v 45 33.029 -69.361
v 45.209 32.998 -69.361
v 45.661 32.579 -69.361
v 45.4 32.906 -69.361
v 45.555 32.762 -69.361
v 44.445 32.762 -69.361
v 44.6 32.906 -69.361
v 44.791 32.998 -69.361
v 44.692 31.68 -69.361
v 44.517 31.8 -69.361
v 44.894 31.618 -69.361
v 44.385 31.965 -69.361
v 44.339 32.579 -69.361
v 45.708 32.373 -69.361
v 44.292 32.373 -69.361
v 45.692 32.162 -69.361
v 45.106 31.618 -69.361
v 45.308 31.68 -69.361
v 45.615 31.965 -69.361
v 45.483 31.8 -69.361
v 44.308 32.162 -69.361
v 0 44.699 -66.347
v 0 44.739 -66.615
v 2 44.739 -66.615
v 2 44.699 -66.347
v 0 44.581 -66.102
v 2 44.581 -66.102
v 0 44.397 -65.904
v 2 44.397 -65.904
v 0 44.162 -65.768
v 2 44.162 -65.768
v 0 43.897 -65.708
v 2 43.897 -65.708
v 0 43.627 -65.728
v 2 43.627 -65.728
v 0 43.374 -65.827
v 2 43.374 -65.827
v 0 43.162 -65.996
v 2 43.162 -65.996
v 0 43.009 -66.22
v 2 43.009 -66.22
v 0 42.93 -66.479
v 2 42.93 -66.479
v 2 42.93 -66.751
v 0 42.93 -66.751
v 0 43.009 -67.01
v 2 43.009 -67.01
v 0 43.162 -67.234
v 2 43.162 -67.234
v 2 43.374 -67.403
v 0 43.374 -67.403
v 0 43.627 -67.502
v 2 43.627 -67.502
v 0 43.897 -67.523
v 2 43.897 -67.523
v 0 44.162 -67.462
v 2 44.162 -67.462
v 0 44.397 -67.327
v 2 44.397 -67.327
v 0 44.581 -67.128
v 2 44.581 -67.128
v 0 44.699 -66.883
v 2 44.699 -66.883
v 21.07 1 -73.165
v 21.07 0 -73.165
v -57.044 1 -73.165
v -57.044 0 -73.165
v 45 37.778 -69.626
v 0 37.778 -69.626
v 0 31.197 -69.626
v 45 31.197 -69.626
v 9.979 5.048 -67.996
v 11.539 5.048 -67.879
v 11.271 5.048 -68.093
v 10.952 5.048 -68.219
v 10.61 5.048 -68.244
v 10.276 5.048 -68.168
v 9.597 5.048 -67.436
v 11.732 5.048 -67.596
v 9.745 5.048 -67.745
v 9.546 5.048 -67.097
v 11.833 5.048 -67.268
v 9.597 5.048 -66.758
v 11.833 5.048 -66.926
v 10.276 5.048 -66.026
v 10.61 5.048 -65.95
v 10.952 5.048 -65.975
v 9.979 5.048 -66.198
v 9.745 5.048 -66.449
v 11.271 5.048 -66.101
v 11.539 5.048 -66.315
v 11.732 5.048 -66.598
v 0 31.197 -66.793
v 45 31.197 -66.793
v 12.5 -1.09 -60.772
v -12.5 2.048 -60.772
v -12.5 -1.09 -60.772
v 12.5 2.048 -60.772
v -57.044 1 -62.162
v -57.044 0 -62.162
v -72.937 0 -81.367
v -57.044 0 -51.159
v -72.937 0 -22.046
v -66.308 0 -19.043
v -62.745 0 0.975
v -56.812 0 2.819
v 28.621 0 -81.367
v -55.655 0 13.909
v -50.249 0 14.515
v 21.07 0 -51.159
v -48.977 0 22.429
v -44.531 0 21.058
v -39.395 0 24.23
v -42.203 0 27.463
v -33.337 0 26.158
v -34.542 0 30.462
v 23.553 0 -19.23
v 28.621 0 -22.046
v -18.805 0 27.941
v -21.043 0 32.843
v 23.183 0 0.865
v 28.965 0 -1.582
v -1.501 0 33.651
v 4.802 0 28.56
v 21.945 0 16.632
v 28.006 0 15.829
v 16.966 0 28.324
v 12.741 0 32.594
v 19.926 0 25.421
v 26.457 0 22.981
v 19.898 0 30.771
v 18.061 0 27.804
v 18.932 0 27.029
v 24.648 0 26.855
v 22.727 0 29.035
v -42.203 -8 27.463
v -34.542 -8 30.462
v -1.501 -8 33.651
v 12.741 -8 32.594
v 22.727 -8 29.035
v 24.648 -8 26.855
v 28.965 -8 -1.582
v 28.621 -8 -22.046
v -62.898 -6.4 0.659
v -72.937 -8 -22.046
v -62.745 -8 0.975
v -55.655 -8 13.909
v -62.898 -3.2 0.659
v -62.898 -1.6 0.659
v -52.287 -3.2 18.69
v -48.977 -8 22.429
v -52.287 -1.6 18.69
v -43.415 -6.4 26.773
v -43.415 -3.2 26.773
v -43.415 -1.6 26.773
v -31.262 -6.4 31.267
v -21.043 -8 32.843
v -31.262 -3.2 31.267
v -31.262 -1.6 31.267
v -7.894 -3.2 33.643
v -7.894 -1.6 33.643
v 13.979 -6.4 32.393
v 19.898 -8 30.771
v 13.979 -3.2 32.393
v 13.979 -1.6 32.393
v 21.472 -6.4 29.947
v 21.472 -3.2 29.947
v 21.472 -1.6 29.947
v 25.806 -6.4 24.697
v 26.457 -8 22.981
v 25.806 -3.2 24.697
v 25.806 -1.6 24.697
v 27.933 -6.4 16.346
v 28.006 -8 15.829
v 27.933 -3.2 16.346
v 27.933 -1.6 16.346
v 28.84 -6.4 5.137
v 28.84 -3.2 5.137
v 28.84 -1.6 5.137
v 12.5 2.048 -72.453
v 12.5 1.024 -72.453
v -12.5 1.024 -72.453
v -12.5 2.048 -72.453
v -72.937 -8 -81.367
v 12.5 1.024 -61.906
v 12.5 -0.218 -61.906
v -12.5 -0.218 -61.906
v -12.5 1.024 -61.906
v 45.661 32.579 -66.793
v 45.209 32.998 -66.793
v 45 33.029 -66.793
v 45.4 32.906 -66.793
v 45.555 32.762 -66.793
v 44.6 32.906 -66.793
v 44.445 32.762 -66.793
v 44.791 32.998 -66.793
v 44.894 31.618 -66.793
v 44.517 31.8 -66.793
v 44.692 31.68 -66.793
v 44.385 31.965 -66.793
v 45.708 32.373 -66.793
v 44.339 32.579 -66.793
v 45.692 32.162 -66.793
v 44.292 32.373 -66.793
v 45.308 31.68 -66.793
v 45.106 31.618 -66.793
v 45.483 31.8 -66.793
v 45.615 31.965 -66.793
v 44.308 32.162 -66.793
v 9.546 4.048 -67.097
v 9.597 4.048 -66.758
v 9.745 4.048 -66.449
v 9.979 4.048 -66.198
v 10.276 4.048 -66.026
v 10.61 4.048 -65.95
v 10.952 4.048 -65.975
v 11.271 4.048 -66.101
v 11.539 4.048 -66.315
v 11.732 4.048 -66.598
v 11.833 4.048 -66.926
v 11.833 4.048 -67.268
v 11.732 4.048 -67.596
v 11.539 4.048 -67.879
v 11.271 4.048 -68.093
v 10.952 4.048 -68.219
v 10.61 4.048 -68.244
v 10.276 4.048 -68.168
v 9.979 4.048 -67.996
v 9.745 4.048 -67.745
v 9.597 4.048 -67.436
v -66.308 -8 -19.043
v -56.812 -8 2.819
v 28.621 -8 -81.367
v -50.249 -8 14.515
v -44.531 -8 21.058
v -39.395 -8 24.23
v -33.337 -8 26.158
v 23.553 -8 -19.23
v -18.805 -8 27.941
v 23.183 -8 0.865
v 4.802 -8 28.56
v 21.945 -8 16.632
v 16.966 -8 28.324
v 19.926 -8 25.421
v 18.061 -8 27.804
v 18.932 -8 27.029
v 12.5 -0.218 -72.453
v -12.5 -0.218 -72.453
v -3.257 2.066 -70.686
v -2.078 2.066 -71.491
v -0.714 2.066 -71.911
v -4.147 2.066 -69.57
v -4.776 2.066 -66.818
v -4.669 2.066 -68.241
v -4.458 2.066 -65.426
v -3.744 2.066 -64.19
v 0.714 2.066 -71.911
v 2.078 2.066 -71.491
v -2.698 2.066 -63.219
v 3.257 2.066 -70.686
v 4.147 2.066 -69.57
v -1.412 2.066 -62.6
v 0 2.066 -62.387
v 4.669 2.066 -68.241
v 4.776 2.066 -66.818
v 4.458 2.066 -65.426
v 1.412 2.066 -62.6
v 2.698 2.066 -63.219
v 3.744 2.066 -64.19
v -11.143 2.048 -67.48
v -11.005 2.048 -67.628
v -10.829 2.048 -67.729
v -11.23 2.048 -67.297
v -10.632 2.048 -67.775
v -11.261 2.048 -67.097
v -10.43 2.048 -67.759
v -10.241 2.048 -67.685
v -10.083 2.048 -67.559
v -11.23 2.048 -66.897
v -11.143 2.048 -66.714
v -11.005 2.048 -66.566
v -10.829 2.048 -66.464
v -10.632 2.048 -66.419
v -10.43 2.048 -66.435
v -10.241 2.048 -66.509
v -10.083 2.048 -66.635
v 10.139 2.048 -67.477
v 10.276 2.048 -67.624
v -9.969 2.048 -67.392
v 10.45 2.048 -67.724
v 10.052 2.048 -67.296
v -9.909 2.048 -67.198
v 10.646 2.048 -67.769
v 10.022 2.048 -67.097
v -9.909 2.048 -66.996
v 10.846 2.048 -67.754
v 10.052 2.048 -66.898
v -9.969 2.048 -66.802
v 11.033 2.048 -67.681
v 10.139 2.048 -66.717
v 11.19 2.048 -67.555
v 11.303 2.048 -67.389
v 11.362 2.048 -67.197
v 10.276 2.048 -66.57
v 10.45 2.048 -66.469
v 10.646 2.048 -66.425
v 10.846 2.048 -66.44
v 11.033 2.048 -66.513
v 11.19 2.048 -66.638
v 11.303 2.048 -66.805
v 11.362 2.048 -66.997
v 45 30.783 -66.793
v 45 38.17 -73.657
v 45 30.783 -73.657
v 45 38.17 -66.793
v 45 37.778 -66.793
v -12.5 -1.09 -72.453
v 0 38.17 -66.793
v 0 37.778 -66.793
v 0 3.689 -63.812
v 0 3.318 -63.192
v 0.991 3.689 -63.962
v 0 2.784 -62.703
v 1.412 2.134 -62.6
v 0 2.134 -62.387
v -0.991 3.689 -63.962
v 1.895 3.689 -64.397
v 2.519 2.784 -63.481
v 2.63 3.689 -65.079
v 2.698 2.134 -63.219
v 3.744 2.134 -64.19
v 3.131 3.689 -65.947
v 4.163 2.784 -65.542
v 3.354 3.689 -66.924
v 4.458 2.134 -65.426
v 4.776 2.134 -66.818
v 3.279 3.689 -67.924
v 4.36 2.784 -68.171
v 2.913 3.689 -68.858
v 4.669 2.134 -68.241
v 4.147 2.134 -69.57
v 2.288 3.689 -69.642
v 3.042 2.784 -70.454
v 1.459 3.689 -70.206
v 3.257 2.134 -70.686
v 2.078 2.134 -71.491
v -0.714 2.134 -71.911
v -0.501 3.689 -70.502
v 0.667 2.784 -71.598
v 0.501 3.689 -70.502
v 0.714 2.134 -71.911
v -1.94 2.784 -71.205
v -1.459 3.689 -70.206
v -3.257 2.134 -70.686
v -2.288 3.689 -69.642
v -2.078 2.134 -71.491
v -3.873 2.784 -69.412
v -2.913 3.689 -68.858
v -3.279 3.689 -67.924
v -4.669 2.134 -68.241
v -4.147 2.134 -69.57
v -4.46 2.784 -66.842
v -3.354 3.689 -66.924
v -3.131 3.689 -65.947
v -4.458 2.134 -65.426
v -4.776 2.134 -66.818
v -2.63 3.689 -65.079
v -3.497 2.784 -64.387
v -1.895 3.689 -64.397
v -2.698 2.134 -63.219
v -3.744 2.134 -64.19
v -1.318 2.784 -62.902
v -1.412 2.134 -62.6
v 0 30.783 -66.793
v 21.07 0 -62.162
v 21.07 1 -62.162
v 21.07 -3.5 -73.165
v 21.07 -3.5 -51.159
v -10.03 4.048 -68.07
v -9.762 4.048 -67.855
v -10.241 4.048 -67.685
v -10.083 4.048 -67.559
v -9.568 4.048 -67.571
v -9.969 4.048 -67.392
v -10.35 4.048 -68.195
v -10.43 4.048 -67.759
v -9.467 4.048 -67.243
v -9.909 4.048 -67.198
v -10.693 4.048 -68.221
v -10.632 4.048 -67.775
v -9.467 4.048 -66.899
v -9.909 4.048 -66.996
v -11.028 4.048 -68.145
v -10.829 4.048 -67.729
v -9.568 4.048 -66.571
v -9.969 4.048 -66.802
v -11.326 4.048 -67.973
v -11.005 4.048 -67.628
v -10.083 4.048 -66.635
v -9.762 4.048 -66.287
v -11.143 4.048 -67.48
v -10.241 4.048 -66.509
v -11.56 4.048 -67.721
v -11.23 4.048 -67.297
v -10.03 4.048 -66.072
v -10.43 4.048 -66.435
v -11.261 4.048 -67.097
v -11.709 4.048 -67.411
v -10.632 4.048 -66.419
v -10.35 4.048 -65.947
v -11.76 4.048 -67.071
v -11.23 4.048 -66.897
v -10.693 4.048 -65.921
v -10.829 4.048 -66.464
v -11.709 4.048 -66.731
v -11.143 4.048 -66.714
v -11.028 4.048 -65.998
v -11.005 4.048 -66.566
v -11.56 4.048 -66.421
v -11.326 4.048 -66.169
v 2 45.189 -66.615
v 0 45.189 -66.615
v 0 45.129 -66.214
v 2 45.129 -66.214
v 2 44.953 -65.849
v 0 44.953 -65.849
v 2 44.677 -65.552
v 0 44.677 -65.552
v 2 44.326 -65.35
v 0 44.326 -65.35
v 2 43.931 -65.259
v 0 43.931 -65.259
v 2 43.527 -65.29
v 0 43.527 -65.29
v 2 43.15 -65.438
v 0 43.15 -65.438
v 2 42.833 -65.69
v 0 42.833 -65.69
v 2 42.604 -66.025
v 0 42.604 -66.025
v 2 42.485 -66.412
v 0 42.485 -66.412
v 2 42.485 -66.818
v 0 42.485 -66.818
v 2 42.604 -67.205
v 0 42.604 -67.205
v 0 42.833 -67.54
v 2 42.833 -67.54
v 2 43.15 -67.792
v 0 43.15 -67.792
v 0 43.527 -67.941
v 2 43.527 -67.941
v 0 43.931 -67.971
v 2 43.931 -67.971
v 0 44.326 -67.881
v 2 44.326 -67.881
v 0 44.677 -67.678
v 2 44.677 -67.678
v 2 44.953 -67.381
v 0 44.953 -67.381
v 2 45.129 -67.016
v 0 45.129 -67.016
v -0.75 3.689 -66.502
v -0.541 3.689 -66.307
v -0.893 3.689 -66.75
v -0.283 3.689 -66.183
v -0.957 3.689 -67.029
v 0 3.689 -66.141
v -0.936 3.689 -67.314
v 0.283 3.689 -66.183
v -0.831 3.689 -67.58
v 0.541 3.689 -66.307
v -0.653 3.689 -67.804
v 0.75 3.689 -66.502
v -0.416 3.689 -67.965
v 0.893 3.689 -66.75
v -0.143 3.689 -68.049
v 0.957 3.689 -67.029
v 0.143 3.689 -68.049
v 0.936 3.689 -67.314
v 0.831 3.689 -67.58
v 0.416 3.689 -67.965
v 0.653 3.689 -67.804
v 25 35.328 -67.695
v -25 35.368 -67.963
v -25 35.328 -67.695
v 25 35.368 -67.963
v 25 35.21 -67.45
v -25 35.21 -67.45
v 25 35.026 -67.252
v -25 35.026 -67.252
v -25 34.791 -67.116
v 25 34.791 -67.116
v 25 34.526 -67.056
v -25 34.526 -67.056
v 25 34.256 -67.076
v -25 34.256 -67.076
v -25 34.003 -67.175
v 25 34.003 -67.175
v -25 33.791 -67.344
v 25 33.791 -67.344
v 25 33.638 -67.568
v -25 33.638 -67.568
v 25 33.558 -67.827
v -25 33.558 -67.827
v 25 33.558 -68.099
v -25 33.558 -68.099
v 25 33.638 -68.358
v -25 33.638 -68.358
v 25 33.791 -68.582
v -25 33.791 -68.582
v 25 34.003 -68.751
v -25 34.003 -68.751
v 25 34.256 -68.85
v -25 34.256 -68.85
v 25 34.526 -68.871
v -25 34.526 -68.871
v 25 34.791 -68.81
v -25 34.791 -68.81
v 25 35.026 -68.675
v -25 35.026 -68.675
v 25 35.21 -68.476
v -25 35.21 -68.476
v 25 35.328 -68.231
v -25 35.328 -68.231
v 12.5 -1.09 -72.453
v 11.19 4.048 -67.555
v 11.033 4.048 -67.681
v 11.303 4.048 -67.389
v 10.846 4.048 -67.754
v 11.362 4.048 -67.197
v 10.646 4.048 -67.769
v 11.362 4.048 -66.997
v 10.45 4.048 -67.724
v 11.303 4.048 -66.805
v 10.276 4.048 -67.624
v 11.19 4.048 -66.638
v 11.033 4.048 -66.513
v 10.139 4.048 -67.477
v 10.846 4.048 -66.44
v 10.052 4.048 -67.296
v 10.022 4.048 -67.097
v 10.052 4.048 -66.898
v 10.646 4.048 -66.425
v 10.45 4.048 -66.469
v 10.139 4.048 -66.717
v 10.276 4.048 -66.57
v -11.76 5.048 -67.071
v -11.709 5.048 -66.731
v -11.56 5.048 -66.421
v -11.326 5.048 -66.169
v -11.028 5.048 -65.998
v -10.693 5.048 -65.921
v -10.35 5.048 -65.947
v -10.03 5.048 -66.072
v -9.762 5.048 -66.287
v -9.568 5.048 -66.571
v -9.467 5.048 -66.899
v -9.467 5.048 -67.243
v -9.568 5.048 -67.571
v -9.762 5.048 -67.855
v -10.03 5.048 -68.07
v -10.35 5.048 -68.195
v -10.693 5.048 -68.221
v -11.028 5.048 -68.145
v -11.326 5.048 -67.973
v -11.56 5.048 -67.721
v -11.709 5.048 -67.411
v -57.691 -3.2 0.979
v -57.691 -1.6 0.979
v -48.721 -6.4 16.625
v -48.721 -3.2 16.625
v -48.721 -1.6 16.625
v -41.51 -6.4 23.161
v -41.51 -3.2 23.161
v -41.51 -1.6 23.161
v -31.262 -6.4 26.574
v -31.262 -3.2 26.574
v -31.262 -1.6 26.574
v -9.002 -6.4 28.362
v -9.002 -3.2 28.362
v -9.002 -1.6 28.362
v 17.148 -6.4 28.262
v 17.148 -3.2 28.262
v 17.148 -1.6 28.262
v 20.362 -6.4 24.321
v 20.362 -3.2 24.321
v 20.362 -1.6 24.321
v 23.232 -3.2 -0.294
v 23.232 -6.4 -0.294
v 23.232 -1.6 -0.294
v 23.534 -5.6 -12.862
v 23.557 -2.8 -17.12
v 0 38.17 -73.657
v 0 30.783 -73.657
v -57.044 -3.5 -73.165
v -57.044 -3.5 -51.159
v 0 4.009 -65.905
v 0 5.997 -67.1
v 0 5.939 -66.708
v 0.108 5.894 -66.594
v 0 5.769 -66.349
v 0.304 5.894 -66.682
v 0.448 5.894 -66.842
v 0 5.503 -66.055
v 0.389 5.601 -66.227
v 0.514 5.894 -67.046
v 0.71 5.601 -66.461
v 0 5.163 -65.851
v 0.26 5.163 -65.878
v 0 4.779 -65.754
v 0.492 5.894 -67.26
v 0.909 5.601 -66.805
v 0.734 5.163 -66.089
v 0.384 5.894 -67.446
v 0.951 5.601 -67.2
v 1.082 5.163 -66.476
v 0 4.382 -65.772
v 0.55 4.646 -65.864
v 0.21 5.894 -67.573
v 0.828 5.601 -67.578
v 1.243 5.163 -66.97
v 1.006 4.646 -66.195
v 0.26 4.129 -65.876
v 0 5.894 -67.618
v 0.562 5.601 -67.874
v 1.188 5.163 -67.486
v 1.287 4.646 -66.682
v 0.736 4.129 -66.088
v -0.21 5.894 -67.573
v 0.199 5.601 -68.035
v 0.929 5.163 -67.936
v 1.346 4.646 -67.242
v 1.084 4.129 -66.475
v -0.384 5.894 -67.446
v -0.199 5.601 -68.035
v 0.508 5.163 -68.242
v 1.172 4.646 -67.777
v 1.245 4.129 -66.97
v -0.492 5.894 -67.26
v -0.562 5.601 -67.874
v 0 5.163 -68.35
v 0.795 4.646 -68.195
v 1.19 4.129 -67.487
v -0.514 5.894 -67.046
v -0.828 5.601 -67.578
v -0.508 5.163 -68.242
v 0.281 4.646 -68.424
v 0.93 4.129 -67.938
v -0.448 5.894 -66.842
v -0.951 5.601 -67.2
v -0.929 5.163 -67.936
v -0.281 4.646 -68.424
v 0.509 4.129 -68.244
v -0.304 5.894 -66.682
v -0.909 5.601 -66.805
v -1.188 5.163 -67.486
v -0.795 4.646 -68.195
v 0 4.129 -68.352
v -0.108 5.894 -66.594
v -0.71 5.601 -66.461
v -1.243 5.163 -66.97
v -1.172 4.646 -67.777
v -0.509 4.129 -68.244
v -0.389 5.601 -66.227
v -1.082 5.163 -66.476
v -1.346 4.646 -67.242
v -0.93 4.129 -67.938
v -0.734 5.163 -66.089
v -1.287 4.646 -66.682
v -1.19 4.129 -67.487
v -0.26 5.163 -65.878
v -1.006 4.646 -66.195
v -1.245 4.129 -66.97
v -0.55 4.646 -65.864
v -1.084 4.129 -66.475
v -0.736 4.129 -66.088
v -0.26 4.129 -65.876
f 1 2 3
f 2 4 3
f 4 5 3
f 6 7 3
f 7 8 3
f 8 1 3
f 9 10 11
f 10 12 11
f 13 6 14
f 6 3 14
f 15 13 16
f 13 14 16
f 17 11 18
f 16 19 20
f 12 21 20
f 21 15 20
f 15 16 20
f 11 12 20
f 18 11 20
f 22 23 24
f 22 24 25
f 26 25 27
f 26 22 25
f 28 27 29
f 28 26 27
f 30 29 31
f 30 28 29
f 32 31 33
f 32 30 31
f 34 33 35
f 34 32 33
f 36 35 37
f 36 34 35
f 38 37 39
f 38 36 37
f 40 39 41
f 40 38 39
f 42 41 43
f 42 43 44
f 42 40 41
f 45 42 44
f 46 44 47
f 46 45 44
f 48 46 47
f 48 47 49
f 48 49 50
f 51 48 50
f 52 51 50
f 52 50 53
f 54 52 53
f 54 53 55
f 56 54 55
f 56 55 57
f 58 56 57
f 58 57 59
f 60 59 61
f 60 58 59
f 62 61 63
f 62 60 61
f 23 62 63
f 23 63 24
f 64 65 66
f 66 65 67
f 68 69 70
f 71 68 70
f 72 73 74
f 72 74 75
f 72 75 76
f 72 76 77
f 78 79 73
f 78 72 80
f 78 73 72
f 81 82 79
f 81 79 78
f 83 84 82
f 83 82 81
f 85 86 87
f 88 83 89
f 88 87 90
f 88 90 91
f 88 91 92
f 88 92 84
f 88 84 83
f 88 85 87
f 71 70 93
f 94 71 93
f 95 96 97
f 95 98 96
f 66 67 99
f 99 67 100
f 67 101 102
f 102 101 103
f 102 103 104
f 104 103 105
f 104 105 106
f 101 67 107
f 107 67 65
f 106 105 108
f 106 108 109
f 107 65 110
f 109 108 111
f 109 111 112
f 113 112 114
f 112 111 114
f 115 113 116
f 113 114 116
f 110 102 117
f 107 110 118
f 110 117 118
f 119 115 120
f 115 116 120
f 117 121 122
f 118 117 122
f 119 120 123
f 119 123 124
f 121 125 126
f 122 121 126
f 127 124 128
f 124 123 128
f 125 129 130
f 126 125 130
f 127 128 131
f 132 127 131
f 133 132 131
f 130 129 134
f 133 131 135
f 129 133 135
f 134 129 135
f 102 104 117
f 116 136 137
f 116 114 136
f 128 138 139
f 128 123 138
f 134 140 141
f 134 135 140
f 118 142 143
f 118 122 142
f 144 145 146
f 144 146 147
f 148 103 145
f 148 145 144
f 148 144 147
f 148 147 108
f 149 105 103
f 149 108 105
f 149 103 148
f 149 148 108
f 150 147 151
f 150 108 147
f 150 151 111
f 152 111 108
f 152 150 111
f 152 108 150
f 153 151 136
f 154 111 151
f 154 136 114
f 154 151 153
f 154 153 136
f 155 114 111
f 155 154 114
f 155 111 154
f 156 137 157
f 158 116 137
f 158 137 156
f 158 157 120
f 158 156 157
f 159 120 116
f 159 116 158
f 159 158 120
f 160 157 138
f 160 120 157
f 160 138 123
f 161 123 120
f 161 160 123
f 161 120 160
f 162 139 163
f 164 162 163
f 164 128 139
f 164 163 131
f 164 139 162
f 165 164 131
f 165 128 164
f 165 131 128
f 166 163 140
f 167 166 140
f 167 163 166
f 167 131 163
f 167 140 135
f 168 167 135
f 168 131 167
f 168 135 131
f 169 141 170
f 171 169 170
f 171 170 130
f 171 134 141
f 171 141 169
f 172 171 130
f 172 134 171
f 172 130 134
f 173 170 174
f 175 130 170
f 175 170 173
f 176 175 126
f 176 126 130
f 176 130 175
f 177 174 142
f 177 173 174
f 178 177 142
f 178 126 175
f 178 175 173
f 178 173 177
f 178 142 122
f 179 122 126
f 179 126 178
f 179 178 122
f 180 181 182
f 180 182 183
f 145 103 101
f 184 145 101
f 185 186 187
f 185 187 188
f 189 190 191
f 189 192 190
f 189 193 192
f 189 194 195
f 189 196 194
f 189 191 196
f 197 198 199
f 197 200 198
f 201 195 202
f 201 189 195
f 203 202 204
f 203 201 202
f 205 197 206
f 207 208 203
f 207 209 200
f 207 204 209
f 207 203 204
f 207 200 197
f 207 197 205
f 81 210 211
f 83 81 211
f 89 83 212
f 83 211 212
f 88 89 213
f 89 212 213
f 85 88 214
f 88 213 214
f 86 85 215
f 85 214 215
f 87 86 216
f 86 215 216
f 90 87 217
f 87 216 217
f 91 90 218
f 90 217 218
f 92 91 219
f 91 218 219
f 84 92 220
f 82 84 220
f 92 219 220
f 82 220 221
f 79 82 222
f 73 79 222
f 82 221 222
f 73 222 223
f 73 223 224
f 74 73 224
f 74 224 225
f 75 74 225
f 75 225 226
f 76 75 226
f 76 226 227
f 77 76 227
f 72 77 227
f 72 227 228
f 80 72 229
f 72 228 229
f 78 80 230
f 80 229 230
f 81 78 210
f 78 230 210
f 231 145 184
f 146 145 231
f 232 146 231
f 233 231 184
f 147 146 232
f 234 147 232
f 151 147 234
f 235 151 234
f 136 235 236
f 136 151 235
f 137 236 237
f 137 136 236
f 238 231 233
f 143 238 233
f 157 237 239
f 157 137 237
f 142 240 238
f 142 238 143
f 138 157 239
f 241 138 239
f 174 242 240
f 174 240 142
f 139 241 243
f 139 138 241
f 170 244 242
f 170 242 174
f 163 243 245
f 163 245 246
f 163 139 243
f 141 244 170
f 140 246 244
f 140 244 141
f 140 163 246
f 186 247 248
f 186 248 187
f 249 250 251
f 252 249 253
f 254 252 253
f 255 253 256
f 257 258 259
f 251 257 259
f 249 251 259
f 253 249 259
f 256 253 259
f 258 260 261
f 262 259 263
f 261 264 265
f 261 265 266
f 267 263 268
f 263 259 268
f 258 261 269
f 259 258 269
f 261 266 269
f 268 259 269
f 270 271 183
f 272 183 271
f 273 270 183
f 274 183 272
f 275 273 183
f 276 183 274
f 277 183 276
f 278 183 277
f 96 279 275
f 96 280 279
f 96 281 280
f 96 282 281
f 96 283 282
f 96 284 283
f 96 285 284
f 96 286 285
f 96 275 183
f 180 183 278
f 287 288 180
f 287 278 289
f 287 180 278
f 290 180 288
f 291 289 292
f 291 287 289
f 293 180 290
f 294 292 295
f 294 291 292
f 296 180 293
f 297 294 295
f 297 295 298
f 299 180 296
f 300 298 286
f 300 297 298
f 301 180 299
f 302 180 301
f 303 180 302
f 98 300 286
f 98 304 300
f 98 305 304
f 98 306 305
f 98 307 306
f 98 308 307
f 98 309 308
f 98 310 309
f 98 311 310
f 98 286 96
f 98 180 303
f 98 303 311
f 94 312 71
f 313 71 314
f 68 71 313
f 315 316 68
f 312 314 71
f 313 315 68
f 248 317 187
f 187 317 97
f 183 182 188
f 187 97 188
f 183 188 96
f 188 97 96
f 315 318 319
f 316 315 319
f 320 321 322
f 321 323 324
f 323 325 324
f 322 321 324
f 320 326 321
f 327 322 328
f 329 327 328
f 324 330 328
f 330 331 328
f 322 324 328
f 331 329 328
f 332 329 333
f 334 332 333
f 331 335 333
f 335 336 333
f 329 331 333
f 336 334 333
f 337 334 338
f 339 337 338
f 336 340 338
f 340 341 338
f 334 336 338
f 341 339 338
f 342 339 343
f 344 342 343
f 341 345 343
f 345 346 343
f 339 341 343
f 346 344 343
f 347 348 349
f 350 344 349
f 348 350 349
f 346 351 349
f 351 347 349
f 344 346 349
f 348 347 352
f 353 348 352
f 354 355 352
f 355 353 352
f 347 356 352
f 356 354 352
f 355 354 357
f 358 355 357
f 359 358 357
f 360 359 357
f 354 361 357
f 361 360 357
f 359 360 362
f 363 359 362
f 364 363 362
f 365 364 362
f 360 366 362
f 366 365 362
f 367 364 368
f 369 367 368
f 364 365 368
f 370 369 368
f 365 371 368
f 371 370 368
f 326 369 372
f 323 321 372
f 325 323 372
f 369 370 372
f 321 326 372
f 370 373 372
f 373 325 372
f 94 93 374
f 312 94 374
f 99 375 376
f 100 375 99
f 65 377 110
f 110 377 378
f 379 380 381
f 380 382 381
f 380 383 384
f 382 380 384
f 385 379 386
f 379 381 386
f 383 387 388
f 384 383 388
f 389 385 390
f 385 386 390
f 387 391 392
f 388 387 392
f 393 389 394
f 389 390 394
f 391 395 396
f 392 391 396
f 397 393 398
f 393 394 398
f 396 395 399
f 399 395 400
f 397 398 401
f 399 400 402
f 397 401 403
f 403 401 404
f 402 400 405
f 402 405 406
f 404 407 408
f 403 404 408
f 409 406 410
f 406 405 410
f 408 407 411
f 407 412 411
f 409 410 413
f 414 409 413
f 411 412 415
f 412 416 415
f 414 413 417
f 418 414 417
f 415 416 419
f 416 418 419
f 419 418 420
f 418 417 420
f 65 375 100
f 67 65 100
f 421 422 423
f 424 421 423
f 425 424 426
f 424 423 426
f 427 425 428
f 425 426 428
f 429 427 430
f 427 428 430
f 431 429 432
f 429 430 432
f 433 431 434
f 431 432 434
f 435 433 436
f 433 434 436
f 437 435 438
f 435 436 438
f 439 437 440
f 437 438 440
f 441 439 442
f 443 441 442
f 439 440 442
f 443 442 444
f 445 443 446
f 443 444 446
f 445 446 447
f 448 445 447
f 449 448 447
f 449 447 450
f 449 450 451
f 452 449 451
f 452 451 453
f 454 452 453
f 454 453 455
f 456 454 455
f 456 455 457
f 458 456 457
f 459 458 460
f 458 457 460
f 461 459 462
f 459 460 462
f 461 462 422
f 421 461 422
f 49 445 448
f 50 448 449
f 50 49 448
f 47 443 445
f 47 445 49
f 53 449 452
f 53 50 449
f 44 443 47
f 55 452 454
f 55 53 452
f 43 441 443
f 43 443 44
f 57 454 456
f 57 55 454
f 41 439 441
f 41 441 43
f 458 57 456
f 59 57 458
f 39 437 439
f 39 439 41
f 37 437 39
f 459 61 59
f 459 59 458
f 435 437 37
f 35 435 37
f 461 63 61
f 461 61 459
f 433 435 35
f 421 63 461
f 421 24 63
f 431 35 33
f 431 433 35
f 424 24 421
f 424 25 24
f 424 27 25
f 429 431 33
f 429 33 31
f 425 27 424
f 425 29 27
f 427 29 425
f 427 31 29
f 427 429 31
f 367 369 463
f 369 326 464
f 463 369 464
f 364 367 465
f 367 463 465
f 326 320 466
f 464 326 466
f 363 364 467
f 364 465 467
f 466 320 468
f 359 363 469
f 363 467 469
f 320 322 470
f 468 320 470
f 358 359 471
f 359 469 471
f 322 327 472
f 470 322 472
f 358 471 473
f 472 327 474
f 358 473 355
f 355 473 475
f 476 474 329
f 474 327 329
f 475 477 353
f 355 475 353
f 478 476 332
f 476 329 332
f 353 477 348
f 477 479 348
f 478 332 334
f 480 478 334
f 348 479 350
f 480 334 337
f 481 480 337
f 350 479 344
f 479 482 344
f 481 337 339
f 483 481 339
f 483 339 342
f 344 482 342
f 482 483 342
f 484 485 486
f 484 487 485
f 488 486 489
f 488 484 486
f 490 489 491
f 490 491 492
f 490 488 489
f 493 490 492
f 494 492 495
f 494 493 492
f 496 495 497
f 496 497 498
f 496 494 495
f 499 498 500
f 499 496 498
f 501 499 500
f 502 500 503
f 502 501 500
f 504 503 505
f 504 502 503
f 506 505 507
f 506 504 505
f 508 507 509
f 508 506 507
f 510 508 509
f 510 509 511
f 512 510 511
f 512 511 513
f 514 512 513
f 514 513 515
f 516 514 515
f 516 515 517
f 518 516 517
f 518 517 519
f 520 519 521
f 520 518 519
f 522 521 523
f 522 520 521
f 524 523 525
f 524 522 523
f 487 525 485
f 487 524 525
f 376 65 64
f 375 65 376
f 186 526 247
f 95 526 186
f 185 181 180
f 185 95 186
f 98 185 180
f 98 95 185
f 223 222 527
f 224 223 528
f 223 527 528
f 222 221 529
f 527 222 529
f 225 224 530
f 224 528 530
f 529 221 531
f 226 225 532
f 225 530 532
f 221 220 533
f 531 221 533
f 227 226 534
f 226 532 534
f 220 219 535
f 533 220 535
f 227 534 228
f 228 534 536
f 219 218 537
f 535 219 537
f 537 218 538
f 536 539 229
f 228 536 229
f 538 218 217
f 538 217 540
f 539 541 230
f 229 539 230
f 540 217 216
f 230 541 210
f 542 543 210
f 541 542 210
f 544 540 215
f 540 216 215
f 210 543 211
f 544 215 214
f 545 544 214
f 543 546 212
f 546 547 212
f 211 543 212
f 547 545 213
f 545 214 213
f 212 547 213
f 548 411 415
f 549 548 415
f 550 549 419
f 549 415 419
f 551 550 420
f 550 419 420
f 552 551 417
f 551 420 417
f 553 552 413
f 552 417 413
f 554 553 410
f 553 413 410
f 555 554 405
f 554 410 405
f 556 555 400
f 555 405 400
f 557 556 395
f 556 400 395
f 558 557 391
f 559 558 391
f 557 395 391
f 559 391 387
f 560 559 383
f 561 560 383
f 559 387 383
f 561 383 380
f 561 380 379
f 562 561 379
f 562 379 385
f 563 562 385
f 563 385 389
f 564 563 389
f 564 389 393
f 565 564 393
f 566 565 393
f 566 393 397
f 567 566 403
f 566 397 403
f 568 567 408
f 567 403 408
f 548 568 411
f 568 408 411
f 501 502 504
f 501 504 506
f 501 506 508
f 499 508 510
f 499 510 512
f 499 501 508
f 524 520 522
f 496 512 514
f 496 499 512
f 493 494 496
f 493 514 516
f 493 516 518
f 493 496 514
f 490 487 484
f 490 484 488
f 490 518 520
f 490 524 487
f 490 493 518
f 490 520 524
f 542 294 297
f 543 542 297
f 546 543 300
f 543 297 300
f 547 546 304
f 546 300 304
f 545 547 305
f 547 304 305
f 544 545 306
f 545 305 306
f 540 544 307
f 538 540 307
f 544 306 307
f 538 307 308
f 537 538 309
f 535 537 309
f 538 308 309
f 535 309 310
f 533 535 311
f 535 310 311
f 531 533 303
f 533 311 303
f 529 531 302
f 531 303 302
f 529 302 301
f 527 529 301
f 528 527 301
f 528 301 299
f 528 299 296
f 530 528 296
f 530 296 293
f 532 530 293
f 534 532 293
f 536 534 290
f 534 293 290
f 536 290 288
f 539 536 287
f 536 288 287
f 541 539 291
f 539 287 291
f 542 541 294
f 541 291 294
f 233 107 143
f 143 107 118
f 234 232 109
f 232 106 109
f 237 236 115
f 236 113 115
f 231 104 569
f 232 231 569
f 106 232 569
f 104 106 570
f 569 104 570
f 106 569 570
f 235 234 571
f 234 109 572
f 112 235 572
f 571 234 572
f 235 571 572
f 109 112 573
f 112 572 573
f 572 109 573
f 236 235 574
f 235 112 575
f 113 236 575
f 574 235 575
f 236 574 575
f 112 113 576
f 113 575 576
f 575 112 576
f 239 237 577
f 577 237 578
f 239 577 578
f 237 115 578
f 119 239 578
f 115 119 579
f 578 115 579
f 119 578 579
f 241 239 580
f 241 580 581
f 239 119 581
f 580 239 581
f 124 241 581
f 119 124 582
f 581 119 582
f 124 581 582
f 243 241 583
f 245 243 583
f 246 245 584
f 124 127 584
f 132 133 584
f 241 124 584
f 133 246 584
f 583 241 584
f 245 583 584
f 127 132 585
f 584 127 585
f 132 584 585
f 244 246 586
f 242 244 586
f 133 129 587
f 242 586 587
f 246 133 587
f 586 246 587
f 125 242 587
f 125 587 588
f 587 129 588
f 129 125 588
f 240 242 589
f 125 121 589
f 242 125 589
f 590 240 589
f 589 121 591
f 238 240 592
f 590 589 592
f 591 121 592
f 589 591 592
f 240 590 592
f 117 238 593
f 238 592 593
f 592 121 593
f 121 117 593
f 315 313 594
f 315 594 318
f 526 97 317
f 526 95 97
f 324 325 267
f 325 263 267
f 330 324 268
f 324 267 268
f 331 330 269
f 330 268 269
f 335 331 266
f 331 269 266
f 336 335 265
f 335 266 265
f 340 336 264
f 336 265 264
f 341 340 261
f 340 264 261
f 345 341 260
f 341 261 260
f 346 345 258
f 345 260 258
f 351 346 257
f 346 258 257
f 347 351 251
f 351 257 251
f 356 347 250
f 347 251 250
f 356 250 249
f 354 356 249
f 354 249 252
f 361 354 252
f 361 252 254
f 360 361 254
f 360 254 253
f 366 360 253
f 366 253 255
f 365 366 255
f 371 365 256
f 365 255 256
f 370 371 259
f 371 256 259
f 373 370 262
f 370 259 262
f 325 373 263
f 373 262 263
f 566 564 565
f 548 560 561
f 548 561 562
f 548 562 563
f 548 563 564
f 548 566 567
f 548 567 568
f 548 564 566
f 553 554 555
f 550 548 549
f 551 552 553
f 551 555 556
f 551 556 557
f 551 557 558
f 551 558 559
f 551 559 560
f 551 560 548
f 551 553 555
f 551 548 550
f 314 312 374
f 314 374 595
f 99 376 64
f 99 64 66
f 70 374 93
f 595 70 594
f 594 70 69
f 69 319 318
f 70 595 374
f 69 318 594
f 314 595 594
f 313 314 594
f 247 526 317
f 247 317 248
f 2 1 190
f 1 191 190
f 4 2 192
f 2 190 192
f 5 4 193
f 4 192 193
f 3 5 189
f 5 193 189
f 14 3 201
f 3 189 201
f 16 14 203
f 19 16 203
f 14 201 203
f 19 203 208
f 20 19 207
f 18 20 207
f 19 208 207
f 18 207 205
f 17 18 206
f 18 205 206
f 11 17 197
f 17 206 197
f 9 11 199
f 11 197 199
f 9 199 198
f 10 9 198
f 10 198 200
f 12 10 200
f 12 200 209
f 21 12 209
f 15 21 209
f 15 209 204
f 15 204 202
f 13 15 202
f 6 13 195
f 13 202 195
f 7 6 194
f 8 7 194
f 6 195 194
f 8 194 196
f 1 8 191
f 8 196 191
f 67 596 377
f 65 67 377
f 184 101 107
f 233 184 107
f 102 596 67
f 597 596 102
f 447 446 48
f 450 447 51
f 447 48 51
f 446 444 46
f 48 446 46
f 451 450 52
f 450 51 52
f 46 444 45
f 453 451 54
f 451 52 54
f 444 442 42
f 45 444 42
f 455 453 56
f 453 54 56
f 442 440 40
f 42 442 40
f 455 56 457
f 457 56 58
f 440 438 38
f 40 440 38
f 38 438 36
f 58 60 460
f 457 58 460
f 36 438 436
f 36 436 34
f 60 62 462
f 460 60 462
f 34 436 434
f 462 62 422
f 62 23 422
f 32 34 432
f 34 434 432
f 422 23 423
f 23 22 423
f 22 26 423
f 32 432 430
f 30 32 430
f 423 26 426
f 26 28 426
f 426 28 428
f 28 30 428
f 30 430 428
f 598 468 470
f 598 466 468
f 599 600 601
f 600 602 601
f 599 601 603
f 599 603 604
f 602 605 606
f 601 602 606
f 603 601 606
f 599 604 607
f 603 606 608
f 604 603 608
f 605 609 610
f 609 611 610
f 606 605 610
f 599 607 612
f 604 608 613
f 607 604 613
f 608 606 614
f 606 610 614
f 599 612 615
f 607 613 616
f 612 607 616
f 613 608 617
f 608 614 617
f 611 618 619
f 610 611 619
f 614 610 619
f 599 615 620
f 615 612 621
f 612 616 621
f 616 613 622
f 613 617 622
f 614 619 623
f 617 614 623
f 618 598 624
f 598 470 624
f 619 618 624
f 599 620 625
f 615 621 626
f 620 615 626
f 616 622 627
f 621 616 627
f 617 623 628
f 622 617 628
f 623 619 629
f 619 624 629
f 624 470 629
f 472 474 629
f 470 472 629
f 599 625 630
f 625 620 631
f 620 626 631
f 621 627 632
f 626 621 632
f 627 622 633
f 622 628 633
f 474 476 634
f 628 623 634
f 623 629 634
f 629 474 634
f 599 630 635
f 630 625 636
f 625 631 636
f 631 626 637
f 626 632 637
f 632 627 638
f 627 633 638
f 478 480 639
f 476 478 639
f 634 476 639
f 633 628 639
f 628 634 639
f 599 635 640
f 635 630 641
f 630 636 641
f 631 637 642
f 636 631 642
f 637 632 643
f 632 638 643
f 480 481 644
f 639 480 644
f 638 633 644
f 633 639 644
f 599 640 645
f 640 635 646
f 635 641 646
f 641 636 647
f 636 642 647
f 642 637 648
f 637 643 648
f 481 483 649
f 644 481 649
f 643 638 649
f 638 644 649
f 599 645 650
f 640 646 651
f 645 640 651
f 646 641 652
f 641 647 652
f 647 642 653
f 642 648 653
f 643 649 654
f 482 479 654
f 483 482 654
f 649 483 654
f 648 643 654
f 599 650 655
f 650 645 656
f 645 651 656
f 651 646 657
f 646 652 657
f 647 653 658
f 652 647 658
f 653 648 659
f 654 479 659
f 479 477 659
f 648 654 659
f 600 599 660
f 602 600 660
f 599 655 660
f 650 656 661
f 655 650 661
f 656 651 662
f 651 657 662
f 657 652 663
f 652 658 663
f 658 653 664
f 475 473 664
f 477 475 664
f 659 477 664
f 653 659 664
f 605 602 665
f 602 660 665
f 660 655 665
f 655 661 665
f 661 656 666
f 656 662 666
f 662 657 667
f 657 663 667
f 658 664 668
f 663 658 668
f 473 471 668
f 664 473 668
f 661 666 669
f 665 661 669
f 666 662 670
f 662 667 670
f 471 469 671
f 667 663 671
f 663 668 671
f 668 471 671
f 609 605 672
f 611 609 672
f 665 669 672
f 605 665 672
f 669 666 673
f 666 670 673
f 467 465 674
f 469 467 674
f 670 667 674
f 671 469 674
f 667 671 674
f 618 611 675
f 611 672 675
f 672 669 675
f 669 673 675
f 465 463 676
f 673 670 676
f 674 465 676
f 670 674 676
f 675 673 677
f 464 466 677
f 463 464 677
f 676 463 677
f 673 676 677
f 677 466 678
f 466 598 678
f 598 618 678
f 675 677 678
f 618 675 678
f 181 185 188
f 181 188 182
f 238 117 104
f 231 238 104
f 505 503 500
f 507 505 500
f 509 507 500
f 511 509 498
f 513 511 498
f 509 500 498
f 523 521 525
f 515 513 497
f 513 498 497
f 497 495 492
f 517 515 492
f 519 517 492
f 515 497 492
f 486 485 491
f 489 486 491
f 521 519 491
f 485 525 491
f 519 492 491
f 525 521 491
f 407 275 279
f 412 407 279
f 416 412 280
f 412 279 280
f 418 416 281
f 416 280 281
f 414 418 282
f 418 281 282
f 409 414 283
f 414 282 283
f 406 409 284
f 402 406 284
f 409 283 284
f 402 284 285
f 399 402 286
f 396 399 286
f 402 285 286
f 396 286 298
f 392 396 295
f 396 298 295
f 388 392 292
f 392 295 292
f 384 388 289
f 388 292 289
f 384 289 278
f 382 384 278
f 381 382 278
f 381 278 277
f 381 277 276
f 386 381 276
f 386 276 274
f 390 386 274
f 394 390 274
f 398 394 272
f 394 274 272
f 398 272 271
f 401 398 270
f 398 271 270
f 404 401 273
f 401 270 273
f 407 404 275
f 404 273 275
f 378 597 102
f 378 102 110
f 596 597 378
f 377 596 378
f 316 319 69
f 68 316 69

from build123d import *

# Parameters (mm, degrees)
F0_W      = 78.1136769801
F0_H      = 22.0055021346
F1_DEPTH  = 8
F2_DEPTH  = 3.5
F3_W      = 78.1136769801
F3_H      = 11.0027510673
F4_DEPTH  = 1
F6_DEPTH  = 12.5
F7_R      = 0.6740837688
F7_R_2    = 0.6794872763
F8_DEPTH  = 2
F9_R      = 1.1503813394
F9_R_2    = 1.1532026448
F10_DEPTH = 1
F15_R     = 0.9100184441
F16_DEPTH = 25
F18_DEPTH = 45
F19_W     = 0.7096510381
F19_H     = 2.5684013963
F15_R_2   = 1.3595382542
F21_DEPTH = 2


with BuildPart() as f1:
    # F0 (on Front) → F1 (new body)
    with BuildSketch(Plane.XZ):
        with BuildLine():
            Line((-72.9369357123, -81.3669546917), (28.6214776443, -81.3669546917))
            Line((28.6214776443, -81.3669546917), (28.6214776443, -22.0463353619))
            add(Edge.make_bspline(
                [(-72.9369357123, -22.0463353619), (-66.3079296953, -6.3903379982), (-54.8236810491, 20.7324864598), (-33.1368908634, 33.9886563081), (14.1885215953, 34.4693387216), (29.9138992328, 26.3054952003), (29.1285218253, -3.0768949366), (28.6214776443, -22.0463353619)],
                knots=[0, 0, 0, 0, 0.2327586614, 0.4032366747, 0.6349341911, 0.7643114096, 1, 1, 1, 1], degree=3))
            Line((-72.9369357123, -22.0463353619), (-72.9369357123, -81.3669546917))
        make_face()
        with Locations((-17.9867846891, -62.162226066)):
            Rectangle(F0_W, F0_H, mode=Mode.SUBTRACT)
        with BuildLine():
            Line((23.5529407965, -19.2304815576), (-66.3079296953, -19.0427604541))
            add(Edge.make_bspline(
                [(-66.3079296953, -19.0427604541), (-60.6025988038, -5.2091205775), (-50.8417035049, 18.4579923395), (-32.9418385651, 29.0509048337), (11.2998233245, 28.2534036027), (23.8422582571, 29.4620440208), (23.5609324216, -16.9963213799), (23.5529407965, -19.2304815576)],
                knots=[0, 0, 0, 0, 0.2292277789, 0.3921715308, 0.6301185848, 0.7440435368, 0.9842506716, 0.9842506716, 0.9842506716, 0.9842506716], degree=3))
        make_face(mode=Mode.SUBTRACT)
        with Locations((-17.9867846891, -62.162226066)):
            Rectangle(F0_W, F0_H)
    extrude(amount=F1_DEPTH)

    # F0 (on Front) → F2 (cut, symmetric)
    with BuildSketch(Plane.XZ):
        with Locations((-17.9867846891, -62.162226066)):
            Rectangle(F0_W, F0_H)
    extrude(amount=F2_DEPTH, both=True, mode=Mode.SUBTRACT)


with BuildPart() as f4:
    # F3 (on face) → F4 (new body)
    with BuildSketch(Plane(origin=(0, 0, 0), x_dir=(-1, 0, 0), z_dir=(0, 1, 0))):
        with Locations((17.9867846891, -67.6636015996)):
            Rectangle(F3_W, F3_H)
    extrude(amount=F4_DEPTH)


with BuildPart() as f6:
    # F5 (on Right) → F6 (new body, symmetric)
    with BuildSketch(Plane.YZ):
        Polygon((-1.0896978201, -60.7723593712), (-1.0896978201, -72.45323807), (-0.2179905568, -72.45323807), (-0.2179905568, -61.9055777788), (1.0241923155, -61.9055777788), (1.0241923155, -72.45323807), (2.0484484266, -72.45323807), (2.0484484266, -60.7723593712), align=None)
    extrude(amount=F6_DEPTH, both=True)

    # F7 (on face) → F8 (join)
    with BuildSketch(Plane(origin=(0, 2.0484484266, 0), x_dir=(-1, 0, 0), z_dir=(0, 1, 0))):
        with Locations((-10.6959426776, -67.096978426)):
            Circle(F7_R)
        with Locations((10.5811031535, -67.096978426)):
            Circle(F7_R_2)
    extrude(amount=F8_DEPTH)

    # F9 (on face) → F10 (join)
    with BuildSketch(Plane(origin=(0, 4.0484484266, 0), x_dir=(-1, 0, 0), z_dir=(0, 1, 0))):
        with Locations((-10.6959426776, -67.096978426)):
            Circle(F9_R)
        with Locations((10.6070199981, -67.0710653067)):
            Circle(F9_R_2)
    extrude(amount=F10_DEPTH)


with BuildPart() as f12:
    # F11 (on Right) → F12 (revolve)
    with BuildSketch(Plane.YZ):
        with BuildLine():
            Line((2.1344509079, -62.3869039118), (2.0657987334, -62.3869039118))
            Line((2.0657987334, -62.3869039118), (2.0657987334, -67.175835371))
            Line((2.0657987334, -67.175835371), (3.6893903743, -67.175835371))
            Line((3.6893903743, -67.175835371), (3.6893903743, -63.812112902))
            ThreePointArc((3.6893903743, -63.812112902), (3.0686592581, -62.9285025663), (2.1344509079, -62.3869039118))
        make_face()
    revolve(axis=Axis((0, 4.3976157904, -67.175835371), (0, 1, 0)))

    # F13 (on Right) → F14 (revolve)
    with BuildSketch(Plane.YZ):
        with BuildLine():
            Line((3.290206524, -67.100353539), (5.9968891046, -67.100353539))
            ThreePointArc((5.9968891046, -67.100353539), (4.6435478143, -65.7470122487), (3.290206524, -67.100353539))
        make_face()
    revolve(axis=Axis((0, 4.8515796661, -67.100353539), (0, 1, 0)))


with BuildPart() as f16:
    # F15 (on Right) → F16 (new body, symmetric)
    with BuildSketch(Plane.YZ):
        with Locations((34.4581520185, -67.963078618)):
            Circle(F15_R)
    extrude(amount=F16_DEPTH, both=True)


with BuildPart() as f18:
    # F17 (on Right) → F18 (new body)
    with BuildSketch(Plane.YZ):
        Polygon((31.1965886503, -66.7925700545), (30.7825282216, -66.7925700545), (30.7825282216, -73.6572667956), (38.17024827, -73.6572667956), (38.17024827, -66.7925700545), (37.7779789269, -66.7925700545), (37.7779789269, -69.6256235242), (31.1965886503, -69.6256235242), align=None)
    extrude(amount=F18_DEPTH)


with BuildPart() as f20:
    # F19 (on face) → F20 (revolve)
    with BuildSketch(Plane.YZ.offset(45)):
        with Locations((32.674622722, -68.0767707527)):
            Rectangle(F19_W, F19_H)
    revolve(axis=Axis((45, 32.3197972029, -68.3149024844), (0, 0, -1)))


with BuildPart() as f21:
    # F15 (on Right) → F21 (new body)
    with BuildSketch(Plane.YZ):
        with Locations((43.8293851912, -66.6150972247)):
            Circle(F15_R_2)
        with Locations((43.8293851912, -66.6150972247)):
            Circle(F15_R, mode=Mode.SUBTRACT)
    extrude(amount=F21_DEPTH)


solid = Compound([f1.part, f4.part, f6.part, f12.part, f16.part, f18.part, f20.part, f21.part])
